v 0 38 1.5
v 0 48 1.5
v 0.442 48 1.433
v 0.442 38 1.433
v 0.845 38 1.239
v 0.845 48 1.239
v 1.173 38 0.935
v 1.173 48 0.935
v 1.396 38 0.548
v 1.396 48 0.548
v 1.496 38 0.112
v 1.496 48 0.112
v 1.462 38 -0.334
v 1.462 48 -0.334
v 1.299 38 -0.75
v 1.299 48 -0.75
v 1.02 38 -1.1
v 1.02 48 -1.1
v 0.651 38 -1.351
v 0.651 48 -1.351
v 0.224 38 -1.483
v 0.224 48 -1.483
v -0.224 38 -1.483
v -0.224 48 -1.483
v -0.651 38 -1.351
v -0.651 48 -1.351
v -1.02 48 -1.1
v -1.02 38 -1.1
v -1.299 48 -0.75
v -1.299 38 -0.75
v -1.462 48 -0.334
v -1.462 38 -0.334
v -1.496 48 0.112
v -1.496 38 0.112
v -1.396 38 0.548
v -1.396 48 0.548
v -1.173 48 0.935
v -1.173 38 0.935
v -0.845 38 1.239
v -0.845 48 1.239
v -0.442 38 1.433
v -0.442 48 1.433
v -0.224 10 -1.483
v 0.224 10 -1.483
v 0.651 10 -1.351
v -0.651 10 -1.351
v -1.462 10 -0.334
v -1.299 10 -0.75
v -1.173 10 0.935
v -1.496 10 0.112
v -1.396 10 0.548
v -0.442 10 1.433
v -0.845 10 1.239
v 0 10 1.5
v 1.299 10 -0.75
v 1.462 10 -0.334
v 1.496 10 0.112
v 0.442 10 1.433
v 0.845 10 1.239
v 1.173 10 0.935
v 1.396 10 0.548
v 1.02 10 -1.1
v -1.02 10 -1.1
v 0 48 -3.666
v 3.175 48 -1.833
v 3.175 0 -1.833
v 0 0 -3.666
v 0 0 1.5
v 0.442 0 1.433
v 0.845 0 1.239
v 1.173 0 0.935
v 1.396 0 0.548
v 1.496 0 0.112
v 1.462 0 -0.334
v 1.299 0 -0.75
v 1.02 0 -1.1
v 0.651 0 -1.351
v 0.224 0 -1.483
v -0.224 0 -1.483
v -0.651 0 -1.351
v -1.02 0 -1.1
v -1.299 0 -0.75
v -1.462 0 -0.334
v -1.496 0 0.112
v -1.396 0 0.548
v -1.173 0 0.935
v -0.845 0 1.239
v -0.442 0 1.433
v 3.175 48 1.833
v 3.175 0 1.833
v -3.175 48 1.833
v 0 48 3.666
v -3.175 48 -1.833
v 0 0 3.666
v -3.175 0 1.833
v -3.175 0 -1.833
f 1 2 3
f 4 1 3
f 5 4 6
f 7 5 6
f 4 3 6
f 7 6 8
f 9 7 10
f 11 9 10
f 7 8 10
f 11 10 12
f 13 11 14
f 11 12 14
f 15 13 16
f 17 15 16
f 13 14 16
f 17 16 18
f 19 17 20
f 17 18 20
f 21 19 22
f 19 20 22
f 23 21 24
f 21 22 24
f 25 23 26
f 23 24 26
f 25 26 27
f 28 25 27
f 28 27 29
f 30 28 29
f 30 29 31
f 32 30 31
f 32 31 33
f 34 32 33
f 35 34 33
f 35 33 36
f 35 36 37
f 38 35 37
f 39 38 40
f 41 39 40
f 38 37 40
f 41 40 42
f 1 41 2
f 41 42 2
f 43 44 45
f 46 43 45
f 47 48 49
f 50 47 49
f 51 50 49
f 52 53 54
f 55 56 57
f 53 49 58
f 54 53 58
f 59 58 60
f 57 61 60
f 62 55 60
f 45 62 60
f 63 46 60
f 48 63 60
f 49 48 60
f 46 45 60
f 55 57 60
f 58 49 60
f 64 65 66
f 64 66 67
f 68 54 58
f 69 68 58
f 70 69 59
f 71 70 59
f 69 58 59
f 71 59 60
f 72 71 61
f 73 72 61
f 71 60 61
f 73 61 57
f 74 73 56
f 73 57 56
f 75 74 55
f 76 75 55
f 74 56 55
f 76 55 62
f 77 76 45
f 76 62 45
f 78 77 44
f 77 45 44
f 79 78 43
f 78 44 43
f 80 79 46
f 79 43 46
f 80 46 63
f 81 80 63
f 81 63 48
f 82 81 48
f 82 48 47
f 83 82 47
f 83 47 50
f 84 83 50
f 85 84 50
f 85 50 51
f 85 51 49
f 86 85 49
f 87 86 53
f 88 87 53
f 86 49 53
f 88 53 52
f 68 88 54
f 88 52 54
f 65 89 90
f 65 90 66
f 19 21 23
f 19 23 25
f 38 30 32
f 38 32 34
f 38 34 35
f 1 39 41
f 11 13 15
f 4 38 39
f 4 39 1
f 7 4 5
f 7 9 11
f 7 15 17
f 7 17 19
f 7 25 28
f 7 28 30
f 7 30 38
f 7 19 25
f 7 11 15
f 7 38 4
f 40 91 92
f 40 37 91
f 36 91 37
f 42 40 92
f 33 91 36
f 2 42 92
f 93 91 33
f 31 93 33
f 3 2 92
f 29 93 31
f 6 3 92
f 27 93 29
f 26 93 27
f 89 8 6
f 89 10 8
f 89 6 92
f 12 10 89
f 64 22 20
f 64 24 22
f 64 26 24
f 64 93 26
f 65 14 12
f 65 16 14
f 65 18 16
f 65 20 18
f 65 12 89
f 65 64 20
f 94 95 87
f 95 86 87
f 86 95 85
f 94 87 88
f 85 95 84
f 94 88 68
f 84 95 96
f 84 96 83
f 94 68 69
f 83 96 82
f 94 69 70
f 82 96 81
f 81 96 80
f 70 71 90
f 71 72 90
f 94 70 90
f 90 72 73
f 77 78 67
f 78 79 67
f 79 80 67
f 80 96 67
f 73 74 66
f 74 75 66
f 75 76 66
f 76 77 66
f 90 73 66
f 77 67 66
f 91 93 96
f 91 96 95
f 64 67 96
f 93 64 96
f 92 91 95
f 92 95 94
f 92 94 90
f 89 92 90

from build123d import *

# Parameters (mm, degrees)
SALIENTE_EXTRUIR1_DEPTH = 48
CROQUIS2_R              = 1.5
CORTAR_EXTRUIR1_DEPTH   = 10
CORTAR_EXTRUIR2_START   = -38
CROQUIS2_2_R            = 1.5
CORTAR_EXTRUIR2_DEPTH   = 10


with BuildPart() as part:
    # Croquis1 → Saliente-Extruir1 (new body)
    with BuildSketch(Plane(origin=(0, 0, 0), x_dir=(1, 0, 0), z_dir=(0, 1, 0))):
        Polygon((0, 3.666174209), (-3.175, 1.833087105), (-3.175, -1.833087105), (0, -3.666174209), (3.175, -1.833087105), (3.175, 1.833087105), align=None)
    extrude(amount=SALIENTE_EXTRUIR1_DEPTH)

    # Croquis2 → Cortar-Extruir1 (cut)
    with BuildSketch(Plane(origin=(0, 48, 0), x_dir=(1, 0, 0), z_dir=(0, 1, 0))):
        Circle(CROQUIS2_R)
    extrude(amount=-CORTAR_EXTRUIR1_DEPTH, mode=Mode.SUBTRACT)

    # Croquis2<2> → Cortar-Extruir2 (cut)
    with BuildSketch(Plane(origin=(0, 48, 0), x_dir=(1, 0, 0), z_dir=(0, 1, 0)).offset(CORTAR_EXTRUIR2_START)):
        Circle(CROQUIS2_2_R)
    extrude(amount=-CORTAR_EXTRUIR2_DEPTH, mode=Mode.SUBTRACT)


solid = part.part
